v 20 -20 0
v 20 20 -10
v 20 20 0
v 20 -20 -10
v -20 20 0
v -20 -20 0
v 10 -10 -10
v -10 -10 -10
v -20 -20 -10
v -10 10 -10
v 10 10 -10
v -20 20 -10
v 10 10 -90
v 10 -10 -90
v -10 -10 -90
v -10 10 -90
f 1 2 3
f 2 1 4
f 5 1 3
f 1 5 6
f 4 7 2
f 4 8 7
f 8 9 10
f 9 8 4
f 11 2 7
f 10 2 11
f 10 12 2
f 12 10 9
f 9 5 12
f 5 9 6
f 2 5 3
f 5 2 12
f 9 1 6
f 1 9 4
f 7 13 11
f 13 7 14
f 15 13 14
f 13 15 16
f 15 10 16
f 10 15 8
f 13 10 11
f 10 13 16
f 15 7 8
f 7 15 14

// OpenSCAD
translate([0.0,0.0,-70.0])  union()  {
translate([0.0,0.0,60.0])  translate([-20.0,-20.0,0.0])  cube([40.0,40.0,10.0]);
translate([0.0,0.0,-20.0])  translate([-10.0,-10.0,0.0])  cube([20.0,20.0,80.0]);
}
